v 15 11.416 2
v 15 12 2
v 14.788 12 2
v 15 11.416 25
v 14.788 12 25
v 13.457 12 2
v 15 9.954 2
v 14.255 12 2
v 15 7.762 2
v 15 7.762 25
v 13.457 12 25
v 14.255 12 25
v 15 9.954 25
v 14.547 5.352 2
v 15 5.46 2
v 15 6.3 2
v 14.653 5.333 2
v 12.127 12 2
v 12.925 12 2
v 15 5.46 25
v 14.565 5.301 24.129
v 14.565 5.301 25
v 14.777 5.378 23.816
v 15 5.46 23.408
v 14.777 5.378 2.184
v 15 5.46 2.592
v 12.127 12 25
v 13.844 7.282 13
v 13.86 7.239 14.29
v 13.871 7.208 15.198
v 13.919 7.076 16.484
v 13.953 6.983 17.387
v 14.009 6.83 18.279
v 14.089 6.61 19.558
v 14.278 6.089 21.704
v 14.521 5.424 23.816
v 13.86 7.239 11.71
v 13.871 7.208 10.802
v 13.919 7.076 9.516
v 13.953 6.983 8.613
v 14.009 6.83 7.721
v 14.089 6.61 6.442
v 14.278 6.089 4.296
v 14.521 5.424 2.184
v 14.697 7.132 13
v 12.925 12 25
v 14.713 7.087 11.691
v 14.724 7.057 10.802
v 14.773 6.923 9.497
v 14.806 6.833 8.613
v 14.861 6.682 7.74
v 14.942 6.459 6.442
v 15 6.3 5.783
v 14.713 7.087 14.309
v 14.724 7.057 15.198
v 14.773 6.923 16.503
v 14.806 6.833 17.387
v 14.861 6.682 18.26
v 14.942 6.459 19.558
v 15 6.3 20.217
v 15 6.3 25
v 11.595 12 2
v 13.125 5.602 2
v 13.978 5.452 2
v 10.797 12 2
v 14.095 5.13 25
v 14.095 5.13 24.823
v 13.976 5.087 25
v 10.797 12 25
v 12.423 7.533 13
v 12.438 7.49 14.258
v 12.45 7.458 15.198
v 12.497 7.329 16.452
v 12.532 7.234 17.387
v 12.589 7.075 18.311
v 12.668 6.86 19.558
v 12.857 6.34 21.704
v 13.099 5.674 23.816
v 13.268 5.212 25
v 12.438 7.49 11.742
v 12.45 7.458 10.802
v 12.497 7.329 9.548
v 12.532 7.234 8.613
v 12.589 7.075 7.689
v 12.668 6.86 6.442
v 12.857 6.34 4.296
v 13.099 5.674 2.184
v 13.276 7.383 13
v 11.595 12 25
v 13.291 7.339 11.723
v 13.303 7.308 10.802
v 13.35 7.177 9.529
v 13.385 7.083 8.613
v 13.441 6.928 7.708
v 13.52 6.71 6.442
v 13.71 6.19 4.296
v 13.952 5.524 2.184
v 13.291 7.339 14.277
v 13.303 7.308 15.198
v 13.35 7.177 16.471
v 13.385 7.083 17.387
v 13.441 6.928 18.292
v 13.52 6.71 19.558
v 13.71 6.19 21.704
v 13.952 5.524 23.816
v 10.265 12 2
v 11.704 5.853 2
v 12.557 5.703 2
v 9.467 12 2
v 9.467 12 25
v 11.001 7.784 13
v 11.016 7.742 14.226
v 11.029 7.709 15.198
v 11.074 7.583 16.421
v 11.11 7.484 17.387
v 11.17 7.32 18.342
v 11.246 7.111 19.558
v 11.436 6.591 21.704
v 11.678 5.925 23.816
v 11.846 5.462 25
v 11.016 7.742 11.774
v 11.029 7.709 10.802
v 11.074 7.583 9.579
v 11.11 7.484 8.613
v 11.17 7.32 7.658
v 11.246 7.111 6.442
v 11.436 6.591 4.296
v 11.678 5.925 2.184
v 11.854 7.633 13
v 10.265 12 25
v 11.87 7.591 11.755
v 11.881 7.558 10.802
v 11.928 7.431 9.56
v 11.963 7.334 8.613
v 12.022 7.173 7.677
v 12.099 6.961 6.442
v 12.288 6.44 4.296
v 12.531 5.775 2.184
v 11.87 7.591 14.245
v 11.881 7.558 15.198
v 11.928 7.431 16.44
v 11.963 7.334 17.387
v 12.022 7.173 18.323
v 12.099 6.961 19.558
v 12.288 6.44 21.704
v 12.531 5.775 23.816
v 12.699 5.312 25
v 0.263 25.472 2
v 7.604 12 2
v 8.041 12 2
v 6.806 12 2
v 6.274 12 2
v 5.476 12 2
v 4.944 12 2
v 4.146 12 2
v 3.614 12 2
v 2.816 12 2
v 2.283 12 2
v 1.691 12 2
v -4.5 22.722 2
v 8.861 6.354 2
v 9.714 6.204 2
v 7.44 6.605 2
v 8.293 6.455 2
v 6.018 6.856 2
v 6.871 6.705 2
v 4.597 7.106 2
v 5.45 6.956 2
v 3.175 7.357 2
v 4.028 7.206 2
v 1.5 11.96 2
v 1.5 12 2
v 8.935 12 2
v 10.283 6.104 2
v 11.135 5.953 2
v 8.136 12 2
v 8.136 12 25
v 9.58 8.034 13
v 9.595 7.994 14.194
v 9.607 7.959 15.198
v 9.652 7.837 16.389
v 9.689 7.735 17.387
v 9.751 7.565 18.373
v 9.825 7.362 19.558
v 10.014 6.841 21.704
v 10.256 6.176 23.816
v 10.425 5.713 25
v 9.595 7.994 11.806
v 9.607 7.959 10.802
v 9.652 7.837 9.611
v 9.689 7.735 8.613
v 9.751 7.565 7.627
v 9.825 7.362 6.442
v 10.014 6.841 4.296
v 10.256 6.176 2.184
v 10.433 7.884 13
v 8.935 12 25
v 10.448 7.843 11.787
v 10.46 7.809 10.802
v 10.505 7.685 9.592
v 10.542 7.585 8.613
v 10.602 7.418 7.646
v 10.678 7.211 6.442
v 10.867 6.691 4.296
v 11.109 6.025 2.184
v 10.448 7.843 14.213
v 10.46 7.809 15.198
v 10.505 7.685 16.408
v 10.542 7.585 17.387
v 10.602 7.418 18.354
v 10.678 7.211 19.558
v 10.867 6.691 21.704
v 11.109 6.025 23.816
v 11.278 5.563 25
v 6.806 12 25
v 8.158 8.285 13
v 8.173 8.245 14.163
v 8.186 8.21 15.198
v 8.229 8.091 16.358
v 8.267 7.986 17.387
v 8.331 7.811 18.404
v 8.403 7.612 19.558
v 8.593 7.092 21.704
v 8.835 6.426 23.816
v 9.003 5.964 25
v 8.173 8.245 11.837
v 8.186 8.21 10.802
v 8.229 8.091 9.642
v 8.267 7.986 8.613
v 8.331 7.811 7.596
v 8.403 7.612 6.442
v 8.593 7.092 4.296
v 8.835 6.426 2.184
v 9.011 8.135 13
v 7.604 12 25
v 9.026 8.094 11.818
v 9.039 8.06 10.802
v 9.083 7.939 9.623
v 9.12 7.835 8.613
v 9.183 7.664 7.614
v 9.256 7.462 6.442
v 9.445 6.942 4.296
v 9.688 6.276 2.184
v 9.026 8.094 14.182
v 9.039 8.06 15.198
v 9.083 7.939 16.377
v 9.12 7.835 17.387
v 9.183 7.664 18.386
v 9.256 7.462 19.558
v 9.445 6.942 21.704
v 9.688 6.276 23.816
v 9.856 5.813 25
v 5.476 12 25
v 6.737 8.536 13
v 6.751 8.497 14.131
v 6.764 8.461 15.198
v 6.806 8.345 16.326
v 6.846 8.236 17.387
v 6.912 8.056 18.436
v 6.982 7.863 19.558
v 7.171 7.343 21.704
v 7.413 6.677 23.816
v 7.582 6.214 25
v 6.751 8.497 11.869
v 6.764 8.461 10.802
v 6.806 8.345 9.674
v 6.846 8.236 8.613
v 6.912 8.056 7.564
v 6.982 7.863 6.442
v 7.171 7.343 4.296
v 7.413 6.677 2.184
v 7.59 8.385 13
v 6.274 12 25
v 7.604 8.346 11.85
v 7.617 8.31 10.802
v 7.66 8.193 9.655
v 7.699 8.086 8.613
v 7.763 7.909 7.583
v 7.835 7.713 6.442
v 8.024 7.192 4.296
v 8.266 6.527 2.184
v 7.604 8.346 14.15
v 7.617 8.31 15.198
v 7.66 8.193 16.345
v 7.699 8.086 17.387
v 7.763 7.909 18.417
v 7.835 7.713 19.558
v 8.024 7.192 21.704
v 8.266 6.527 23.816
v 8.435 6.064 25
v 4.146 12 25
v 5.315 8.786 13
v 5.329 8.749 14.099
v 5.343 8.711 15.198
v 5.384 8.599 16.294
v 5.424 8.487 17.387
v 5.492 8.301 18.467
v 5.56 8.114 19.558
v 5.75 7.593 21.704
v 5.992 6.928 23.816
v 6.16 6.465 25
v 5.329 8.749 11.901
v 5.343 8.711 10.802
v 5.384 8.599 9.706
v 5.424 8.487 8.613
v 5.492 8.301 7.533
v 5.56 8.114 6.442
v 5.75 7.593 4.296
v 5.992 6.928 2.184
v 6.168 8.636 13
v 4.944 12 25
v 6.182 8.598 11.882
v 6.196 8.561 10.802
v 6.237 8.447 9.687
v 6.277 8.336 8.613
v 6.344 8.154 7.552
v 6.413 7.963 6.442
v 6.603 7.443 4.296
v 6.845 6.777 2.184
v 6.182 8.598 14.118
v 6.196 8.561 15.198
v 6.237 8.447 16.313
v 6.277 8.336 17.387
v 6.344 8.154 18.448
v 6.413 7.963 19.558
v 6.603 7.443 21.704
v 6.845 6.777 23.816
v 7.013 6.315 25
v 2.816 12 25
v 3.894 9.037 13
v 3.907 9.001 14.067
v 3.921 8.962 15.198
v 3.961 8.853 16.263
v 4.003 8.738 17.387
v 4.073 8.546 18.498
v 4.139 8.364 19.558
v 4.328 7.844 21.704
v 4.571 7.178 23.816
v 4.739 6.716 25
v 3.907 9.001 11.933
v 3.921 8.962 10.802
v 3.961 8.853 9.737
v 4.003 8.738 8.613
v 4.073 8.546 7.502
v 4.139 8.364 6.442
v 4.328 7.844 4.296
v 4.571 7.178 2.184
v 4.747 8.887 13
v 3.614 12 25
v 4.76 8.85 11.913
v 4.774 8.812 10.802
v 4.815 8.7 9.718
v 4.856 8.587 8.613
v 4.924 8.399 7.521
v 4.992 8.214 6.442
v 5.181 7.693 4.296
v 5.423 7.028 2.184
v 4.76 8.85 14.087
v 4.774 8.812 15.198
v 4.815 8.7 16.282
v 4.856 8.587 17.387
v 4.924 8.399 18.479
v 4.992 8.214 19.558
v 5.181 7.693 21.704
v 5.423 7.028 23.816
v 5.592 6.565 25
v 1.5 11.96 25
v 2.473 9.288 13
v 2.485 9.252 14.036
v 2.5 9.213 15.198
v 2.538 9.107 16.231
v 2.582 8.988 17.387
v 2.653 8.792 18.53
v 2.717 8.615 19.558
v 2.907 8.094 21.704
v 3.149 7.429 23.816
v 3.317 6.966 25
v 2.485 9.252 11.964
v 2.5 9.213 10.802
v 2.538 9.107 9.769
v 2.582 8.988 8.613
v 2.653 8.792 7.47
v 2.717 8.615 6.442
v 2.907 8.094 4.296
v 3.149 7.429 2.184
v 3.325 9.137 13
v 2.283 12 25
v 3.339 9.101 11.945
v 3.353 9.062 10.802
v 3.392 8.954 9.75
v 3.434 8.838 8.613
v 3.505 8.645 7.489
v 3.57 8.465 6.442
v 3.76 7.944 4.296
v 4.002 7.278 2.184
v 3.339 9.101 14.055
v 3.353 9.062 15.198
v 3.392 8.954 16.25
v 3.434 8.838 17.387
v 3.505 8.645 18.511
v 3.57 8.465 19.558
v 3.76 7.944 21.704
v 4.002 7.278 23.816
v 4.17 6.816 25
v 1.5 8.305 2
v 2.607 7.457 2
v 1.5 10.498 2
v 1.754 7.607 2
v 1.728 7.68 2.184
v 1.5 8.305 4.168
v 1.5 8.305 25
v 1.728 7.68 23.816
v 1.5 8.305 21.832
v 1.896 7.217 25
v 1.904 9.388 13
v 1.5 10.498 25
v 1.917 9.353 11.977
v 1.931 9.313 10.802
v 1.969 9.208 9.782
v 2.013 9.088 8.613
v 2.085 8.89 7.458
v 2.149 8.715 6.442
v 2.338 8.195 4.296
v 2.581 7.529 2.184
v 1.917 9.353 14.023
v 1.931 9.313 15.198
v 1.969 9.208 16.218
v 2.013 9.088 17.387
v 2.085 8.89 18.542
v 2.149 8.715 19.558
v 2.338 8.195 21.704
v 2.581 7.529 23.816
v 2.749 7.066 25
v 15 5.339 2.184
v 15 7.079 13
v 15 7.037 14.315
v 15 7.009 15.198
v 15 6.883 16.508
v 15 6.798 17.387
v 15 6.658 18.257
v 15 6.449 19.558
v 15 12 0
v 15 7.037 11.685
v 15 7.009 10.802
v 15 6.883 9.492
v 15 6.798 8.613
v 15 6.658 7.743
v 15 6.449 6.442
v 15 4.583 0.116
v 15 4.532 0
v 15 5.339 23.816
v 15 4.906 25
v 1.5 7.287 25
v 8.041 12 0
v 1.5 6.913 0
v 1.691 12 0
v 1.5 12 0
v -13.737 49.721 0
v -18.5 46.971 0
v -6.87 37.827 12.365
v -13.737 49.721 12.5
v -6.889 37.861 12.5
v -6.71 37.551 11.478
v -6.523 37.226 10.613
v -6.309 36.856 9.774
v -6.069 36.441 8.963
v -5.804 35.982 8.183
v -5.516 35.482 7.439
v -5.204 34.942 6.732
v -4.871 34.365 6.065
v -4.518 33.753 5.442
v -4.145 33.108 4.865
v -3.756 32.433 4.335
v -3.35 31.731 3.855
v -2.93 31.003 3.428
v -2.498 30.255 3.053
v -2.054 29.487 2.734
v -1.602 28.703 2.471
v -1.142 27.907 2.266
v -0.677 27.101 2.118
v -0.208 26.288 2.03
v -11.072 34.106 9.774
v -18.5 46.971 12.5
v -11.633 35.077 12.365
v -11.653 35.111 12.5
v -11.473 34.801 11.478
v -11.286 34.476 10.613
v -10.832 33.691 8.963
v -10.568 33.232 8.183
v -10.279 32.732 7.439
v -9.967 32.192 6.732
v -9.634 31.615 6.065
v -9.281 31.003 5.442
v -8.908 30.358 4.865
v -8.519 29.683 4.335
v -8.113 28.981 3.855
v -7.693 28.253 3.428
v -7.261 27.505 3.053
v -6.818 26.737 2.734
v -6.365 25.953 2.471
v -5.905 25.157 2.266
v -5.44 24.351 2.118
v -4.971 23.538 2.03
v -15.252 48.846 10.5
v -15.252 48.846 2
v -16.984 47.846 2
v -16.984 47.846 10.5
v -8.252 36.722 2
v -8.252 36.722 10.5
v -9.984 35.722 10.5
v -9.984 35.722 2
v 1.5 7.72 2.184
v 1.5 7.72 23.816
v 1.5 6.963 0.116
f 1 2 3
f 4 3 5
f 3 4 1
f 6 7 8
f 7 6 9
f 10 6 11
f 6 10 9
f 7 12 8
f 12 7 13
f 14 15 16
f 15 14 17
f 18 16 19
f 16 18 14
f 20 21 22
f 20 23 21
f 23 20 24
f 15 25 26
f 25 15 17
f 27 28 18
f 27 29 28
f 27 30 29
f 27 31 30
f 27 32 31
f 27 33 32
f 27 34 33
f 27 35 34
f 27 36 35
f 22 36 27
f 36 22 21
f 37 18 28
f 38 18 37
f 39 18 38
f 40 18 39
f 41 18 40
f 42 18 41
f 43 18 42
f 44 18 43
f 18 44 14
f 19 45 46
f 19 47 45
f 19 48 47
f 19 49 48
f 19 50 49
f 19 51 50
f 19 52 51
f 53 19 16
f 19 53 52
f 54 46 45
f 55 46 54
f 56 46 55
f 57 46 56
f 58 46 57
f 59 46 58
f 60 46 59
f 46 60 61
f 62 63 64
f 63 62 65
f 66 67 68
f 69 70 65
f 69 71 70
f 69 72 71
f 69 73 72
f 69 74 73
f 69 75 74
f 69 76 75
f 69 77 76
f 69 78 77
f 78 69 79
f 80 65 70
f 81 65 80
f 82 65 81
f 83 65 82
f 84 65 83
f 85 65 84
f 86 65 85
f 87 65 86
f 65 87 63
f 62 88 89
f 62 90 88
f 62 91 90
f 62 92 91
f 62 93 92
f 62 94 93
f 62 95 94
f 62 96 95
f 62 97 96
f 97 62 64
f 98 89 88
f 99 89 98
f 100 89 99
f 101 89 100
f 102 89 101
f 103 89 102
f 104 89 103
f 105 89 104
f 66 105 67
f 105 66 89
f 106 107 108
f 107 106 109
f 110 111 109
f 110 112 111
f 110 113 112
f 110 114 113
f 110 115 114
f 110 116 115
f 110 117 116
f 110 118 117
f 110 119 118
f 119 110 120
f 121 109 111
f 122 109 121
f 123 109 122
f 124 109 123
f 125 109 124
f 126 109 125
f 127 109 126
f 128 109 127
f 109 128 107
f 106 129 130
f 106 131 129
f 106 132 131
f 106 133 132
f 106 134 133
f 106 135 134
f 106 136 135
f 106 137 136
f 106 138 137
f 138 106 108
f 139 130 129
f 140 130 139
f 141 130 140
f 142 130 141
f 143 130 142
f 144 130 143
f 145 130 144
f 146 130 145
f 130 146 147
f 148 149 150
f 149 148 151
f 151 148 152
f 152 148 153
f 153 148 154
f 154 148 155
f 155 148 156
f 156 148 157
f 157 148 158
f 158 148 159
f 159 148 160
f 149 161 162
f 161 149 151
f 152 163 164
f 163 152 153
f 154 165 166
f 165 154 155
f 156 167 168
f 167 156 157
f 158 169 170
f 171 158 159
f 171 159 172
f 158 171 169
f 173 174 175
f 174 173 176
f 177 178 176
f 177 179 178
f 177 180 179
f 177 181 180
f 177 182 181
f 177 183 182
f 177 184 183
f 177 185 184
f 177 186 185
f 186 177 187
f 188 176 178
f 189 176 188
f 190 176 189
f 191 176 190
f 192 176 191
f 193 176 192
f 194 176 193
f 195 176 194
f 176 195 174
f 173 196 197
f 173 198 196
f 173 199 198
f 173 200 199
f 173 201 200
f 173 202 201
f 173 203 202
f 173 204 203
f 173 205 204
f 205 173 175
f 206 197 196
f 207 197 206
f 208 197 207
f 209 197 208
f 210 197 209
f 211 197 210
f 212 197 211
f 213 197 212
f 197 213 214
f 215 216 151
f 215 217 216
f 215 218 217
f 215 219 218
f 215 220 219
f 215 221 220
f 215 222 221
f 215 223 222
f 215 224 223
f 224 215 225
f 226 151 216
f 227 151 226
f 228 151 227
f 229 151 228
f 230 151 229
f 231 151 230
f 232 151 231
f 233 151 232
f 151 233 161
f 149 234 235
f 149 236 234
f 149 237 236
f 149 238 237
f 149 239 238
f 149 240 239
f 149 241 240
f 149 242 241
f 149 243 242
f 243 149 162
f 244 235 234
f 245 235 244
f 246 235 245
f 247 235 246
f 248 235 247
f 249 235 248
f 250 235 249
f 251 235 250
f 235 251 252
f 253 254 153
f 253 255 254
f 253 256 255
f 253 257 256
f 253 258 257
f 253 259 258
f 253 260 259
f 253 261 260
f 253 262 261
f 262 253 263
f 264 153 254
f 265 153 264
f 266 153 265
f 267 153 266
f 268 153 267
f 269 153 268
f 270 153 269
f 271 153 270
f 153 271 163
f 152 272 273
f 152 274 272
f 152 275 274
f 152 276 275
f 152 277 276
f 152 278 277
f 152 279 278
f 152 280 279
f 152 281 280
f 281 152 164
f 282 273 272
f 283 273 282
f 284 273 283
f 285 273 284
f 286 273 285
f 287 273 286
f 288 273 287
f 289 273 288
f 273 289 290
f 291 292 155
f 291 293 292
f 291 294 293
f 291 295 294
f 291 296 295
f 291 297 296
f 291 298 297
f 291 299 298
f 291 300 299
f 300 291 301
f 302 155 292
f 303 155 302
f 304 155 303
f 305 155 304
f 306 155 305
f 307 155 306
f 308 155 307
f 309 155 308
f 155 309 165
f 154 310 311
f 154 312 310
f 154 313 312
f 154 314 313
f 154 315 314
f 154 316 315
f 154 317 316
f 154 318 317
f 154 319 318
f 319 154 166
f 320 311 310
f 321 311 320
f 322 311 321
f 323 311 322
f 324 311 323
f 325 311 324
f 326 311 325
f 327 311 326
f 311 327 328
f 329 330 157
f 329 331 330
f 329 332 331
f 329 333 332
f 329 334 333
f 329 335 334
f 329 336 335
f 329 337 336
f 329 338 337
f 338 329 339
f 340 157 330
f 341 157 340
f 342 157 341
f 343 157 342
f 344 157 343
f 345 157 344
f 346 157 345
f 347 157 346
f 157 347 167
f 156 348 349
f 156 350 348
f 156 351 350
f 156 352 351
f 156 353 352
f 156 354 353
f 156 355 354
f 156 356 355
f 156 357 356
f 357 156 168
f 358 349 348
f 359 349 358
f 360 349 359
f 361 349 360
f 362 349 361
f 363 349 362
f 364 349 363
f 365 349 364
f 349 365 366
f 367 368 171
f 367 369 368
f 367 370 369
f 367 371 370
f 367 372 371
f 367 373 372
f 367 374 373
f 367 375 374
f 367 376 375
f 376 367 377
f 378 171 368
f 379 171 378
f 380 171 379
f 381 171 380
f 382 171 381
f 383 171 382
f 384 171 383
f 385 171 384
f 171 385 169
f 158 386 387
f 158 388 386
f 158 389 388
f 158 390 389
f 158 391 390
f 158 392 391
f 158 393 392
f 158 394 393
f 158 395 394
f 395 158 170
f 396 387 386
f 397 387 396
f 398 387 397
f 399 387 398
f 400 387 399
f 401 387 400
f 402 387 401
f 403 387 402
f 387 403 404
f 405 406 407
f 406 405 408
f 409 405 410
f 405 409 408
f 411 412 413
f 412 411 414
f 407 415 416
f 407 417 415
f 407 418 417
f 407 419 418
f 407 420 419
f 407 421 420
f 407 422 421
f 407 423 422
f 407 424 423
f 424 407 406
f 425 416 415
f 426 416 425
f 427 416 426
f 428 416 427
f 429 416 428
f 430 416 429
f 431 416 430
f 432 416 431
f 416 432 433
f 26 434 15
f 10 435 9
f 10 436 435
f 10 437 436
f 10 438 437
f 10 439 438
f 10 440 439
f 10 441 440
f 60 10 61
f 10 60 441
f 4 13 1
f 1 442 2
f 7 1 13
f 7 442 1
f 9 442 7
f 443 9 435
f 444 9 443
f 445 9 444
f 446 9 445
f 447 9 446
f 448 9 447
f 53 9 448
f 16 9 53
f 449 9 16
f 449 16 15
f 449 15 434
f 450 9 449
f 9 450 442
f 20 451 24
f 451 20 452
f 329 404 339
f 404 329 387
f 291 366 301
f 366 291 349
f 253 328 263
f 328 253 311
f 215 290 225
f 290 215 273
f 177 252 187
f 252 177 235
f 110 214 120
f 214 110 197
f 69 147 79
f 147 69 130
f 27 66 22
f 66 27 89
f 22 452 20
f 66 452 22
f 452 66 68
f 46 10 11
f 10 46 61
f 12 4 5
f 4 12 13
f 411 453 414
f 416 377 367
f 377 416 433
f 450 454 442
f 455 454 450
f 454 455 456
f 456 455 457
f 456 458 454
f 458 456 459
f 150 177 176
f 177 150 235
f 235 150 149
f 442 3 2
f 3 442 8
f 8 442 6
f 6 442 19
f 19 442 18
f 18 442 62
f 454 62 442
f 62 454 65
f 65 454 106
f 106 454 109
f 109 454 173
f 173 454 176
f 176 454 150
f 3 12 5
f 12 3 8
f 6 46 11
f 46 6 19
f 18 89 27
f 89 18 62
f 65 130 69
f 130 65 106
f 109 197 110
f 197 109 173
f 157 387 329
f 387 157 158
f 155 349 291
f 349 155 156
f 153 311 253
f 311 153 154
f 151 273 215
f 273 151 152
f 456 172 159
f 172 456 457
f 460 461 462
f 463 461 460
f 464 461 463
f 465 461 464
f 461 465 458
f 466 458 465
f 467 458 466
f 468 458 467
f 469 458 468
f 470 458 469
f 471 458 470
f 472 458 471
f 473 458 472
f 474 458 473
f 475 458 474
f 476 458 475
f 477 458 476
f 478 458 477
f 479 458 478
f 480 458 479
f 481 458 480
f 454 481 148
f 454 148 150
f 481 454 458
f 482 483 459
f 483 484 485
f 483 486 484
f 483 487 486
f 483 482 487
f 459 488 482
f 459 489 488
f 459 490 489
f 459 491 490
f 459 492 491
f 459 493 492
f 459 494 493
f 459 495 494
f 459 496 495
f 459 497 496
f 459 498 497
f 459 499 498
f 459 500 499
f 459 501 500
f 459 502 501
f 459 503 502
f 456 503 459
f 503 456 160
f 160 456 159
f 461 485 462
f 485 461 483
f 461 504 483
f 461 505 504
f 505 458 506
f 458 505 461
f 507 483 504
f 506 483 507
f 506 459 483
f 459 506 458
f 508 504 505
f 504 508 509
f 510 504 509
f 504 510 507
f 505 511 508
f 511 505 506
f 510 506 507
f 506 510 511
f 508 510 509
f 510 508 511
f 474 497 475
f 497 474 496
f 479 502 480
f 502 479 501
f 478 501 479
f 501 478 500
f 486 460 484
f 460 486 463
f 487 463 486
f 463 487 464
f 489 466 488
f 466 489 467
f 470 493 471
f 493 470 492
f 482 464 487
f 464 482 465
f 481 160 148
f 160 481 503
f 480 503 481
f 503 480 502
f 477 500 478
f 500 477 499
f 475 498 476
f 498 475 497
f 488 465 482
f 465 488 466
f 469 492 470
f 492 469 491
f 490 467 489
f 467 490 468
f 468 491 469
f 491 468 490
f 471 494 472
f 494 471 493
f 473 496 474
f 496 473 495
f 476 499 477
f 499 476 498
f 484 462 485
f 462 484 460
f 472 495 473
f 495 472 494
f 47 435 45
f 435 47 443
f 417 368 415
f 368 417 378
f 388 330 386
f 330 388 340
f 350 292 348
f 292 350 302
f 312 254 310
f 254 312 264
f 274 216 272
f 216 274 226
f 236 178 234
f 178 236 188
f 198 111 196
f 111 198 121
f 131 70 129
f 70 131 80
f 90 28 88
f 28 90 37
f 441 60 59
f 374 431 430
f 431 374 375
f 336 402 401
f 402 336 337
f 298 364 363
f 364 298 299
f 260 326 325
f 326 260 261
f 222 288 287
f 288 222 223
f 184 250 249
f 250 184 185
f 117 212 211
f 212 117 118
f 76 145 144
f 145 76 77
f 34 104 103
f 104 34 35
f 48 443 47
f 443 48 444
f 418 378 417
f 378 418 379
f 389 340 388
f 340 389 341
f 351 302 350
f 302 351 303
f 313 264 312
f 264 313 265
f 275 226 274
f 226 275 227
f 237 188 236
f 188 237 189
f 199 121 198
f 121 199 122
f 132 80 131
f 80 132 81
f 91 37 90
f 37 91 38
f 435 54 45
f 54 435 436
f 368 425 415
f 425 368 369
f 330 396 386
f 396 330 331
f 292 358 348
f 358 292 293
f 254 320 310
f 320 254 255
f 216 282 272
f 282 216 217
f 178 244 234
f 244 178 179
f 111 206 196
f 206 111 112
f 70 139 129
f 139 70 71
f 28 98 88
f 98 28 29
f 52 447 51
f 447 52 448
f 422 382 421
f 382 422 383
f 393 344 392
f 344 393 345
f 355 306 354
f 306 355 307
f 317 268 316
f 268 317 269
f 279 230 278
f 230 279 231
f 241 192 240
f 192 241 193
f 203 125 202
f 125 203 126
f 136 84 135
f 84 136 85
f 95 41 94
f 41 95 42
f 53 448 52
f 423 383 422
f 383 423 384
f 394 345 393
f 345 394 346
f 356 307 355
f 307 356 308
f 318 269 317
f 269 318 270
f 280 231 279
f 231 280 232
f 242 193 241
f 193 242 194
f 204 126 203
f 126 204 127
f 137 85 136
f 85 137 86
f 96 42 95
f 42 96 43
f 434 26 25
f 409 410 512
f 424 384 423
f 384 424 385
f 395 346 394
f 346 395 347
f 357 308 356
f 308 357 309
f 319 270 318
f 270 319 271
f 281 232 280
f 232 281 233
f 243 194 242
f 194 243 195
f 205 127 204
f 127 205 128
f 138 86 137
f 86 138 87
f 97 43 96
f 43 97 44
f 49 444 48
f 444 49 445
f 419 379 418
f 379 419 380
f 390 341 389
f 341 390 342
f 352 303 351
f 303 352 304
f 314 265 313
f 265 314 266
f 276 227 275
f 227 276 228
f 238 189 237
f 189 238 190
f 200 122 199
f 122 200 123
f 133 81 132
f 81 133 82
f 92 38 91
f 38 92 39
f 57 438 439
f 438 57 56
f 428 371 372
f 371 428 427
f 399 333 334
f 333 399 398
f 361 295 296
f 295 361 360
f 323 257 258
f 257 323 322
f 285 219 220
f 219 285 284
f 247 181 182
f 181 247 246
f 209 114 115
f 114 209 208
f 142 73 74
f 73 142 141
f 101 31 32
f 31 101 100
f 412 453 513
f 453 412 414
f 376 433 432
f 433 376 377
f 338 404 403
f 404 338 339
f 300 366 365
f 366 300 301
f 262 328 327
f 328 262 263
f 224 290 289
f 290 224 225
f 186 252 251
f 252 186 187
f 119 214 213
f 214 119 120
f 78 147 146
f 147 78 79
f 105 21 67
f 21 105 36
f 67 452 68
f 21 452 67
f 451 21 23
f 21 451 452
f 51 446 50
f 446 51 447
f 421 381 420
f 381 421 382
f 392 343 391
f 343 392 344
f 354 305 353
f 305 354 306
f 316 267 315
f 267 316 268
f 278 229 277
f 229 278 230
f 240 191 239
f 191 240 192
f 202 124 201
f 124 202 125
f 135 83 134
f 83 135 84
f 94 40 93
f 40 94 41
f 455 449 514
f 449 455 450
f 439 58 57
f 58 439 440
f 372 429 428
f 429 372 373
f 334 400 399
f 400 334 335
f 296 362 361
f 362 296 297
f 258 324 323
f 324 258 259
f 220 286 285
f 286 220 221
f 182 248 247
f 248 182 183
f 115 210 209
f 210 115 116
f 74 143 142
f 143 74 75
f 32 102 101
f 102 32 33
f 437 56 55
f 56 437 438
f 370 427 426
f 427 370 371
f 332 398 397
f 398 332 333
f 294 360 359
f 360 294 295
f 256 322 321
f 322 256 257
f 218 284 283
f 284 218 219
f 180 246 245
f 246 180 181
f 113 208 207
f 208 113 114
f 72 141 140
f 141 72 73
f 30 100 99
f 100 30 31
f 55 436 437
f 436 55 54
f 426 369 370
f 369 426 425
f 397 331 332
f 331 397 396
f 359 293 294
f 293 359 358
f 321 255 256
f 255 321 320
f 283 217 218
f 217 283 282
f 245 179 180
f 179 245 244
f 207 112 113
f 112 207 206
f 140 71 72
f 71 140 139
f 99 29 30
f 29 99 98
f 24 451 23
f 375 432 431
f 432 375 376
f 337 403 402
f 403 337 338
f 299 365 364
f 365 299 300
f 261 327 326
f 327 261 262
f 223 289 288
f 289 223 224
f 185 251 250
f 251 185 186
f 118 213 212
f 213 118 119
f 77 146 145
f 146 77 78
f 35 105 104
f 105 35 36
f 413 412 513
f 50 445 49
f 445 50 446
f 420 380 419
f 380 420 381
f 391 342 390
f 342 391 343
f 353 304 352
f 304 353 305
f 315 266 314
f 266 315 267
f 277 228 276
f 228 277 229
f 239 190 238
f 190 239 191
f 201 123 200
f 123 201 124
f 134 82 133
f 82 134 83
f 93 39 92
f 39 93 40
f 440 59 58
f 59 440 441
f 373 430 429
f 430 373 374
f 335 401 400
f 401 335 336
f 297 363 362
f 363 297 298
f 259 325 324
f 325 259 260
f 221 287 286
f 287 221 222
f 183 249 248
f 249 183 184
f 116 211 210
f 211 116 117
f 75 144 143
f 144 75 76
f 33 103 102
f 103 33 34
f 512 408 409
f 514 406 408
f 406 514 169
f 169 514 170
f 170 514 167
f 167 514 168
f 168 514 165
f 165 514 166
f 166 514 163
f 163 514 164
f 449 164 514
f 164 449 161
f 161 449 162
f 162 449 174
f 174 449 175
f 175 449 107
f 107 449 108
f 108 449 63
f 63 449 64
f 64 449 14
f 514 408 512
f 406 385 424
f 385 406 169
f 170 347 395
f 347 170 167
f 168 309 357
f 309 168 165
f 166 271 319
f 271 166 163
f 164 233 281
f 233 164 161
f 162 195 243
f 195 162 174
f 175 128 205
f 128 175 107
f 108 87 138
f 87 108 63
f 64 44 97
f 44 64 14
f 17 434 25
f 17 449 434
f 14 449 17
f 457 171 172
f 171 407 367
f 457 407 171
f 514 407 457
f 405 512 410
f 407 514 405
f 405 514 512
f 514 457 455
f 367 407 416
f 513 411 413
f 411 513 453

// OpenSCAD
$fn = 100;
difference(){
    union(){
        difference(){
            cube([15,12,25]);
            rotate([0,0,110]){
                for (i = [-25:1.25:20]){               
                    translate([0,i,2]){
                        cube([40,0.75,30]);
                    }
                }
            }
        }

        translate([4,8,0]){
            rotate([0,0,30]){
                difference(){
                    union(){
                        cube([5.5,23,6]);
                        translate([0,20,0]){
                            cube([5.5,25,12.5]);
                        }
                    }
                    translate([1.75,31,2]){
                        cube([2,25,8.5]);
                    }
                    
                    hull(){
                    translate([-13,0,17]){
                    rotate([0,90,0]){
                        cylinder(h=30,d=30);
                        }
                        }
                    translate([-13,17,17]){
                    rotate([0,90,0]){
                        cylinder(h=30,d=30);
                        }
                        }
                        }
                    
                }
            }
        }
        
    }

    translate([-50,-17,13]){
        rotate([0,90,-10]){
           cylinder(d=70,h=100);
        }
    }
    
    translate([-28.5,-18,-1]){
    rotate([0,0,0]){
        cube([30,30,30]);
    }
    }
    
    translate([0,-26,-1]){
    rotate([0,0,0]){
        cube([30,30,30]);
    }
    }
    
}
